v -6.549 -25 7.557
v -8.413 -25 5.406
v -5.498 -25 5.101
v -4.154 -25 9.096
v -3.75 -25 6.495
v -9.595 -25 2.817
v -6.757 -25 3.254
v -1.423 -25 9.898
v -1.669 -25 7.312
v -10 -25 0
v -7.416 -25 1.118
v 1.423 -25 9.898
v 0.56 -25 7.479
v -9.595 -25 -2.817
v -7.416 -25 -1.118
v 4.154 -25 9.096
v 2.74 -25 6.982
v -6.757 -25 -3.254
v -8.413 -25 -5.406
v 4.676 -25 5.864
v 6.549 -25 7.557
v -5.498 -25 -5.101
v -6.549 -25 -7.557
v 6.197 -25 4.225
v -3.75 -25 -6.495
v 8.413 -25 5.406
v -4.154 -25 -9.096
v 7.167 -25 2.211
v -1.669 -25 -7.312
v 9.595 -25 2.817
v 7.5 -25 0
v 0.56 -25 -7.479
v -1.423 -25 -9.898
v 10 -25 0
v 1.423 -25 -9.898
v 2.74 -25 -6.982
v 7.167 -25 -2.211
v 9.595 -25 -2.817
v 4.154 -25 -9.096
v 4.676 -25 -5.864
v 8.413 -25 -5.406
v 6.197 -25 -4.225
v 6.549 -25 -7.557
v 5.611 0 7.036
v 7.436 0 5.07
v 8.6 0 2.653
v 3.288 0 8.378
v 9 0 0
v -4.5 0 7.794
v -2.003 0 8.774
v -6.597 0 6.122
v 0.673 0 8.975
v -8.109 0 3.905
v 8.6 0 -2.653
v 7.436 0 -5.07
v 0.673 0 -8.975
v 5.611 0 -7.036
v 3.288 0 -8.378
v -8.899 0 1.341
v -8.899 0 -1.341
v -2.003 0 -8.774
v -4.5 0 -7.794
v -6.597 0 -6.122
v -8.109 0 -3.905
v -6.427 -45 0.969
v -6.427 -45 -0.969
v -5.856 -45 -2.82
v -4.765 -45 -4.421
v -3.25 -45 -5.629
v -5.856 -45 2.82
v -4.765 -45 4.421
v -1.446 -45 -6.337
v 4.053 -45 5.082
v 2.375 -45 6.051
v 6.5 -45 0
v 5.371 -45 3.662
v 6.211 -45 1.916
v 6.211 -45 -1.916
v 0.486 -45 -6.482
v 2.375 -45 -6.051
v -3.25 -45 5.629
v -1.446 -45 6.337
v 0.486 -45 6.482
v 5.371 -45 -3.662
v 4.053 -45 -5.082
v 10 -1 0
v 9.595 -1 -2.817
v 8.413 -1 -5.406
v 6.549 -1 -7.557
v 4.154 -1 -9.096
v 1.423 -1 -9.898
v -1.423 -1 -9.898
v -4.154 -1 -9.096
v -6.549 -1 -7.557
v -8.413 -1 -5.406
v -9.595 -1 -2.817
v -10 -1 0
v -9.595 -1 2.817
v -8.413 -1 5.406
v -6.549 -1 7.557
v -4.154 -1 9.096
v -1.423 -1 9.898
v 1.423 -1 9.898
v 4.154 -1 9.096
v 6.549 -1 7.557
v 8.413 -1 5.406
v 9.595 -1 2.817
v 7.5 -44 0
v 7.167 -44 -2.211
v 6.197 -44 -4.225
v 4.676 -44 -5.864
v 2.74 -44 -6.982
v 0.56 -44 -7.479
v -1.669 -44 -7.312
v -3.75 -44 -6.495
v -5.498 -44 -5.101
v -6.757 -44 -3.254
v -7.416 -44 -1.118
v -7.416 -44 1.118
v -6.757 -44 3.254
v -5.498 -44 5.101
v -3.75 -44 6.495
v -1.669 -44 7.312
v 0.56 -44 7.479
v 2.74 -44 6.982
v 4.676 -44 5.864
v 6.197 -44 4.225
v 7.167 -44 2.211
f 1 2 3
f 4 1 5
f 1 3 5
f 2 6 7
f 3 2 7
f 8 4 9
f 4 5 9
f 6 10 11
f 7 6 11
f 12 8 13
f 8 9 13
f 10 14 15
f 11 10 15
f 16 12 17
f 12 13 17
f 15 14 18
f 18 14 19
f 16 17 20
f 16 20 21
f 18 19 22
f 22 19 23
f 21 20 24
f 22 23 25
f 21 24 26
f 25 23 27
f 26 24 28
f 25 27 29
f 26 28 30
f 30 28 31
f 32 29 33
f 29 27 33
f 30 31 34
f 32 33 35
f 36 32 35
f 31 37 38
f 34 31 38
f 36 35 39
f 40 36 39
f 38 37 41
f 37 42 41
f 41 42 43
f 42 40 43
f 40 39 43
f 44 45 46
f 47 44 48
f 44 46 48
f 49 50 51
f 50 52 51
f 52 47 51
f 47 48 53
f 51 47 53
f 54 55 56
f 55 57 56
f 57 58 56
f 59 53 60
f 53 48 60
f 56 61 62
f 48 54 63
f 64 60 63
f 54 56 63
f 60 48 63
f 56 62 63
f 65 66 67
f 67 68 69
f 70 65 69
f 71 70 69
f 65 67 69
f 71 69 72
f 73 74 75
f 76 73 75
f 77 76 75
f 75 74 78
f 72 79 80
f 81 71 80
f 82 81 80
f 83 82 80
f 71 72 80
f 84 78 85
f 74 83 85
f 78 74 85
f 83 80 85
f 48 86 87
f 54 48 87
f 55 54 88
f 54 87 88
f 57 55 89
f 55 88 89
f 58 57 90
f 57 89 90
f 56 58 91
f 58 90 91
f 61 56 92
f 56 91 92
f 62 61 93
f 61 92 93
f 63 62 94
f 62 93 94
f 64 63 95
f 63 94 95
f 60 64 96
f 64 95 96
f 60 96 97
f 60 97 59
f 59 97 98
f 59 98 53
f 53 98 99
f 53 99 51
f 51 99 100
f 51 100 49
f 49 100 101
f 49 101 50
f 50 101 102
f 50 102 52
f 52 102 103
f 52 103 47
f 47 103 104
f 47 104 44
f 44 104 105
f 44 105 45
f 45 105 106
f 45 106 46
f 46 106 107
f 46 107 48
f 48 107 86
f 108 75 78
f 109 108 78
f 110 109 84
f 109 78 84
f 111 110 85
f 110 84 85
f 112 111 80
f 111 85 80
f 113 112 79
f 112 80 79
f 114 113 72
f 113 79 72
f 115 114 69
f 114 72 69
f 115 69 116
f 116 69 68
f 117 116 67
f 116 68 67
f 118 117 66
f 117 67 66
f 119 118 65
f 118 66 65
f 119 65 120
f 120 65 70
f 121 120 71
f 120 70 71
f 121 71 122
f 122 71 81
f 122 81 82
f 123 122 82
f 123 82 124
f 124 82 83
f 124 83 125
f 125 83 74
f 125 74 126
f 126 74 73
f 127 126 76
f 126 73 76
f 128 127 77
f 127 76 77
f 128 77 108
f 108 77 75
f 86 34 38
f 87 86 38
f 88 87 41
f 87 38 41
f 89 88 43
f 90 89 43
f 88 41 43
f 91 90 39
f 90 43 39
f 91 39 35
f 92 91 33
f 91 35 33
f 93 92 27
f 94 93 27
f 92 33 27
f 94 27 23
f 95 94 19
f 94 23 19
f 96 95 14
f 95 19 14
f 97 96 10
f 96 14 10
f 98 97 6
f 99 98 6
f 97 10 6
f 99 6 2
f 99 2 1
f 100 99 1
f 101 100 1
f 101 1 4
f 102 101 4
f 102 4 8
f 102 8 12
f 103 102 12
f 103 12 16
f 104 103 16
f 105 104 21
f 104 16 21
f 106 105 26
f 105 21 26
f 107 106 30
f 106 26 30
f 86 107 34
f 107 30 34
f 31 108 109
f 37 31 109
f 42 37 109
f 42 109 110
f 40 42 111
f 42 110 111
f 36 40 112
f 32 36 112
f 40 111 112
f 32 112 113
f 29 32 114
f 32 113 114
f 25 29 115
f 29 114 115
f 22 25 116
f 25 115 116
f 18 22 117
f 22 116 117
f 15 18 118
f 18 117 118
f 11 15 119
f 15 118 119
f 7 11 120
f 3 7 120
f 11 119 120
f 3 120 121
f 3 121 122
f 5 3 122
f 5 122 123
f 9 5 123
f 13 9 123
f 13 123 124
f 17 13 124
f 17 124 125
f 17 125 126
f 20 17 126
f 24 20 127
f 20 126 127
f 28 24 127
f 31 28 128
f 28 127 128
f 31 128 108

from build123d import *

# Parameters (mm, degrees)
CHAMFER_1_SIZE = 1


with BuildPart() as part:
    # 草图1 → 旋转1 (revolve)
    with BuildSketch(Plane.XY):
        Polygon((0, 0), (10, 0), (10, -25), (7.5, -25), (7.5, -45), (0, -45), align=None)
    revolve(axis=Axis((0, -45, 0), (0, 1, 0)))

    # 倒角1
    chamfer_1_edges = [part.edges().sort_by_distance(p)[0] for p in [
        (-7.5, -45, 0),
        (-10, 0, 0),
    ]]
    chamfer(chamfer_1_edges, length=CHAMFER_1_SIZE)


solid = part.part
